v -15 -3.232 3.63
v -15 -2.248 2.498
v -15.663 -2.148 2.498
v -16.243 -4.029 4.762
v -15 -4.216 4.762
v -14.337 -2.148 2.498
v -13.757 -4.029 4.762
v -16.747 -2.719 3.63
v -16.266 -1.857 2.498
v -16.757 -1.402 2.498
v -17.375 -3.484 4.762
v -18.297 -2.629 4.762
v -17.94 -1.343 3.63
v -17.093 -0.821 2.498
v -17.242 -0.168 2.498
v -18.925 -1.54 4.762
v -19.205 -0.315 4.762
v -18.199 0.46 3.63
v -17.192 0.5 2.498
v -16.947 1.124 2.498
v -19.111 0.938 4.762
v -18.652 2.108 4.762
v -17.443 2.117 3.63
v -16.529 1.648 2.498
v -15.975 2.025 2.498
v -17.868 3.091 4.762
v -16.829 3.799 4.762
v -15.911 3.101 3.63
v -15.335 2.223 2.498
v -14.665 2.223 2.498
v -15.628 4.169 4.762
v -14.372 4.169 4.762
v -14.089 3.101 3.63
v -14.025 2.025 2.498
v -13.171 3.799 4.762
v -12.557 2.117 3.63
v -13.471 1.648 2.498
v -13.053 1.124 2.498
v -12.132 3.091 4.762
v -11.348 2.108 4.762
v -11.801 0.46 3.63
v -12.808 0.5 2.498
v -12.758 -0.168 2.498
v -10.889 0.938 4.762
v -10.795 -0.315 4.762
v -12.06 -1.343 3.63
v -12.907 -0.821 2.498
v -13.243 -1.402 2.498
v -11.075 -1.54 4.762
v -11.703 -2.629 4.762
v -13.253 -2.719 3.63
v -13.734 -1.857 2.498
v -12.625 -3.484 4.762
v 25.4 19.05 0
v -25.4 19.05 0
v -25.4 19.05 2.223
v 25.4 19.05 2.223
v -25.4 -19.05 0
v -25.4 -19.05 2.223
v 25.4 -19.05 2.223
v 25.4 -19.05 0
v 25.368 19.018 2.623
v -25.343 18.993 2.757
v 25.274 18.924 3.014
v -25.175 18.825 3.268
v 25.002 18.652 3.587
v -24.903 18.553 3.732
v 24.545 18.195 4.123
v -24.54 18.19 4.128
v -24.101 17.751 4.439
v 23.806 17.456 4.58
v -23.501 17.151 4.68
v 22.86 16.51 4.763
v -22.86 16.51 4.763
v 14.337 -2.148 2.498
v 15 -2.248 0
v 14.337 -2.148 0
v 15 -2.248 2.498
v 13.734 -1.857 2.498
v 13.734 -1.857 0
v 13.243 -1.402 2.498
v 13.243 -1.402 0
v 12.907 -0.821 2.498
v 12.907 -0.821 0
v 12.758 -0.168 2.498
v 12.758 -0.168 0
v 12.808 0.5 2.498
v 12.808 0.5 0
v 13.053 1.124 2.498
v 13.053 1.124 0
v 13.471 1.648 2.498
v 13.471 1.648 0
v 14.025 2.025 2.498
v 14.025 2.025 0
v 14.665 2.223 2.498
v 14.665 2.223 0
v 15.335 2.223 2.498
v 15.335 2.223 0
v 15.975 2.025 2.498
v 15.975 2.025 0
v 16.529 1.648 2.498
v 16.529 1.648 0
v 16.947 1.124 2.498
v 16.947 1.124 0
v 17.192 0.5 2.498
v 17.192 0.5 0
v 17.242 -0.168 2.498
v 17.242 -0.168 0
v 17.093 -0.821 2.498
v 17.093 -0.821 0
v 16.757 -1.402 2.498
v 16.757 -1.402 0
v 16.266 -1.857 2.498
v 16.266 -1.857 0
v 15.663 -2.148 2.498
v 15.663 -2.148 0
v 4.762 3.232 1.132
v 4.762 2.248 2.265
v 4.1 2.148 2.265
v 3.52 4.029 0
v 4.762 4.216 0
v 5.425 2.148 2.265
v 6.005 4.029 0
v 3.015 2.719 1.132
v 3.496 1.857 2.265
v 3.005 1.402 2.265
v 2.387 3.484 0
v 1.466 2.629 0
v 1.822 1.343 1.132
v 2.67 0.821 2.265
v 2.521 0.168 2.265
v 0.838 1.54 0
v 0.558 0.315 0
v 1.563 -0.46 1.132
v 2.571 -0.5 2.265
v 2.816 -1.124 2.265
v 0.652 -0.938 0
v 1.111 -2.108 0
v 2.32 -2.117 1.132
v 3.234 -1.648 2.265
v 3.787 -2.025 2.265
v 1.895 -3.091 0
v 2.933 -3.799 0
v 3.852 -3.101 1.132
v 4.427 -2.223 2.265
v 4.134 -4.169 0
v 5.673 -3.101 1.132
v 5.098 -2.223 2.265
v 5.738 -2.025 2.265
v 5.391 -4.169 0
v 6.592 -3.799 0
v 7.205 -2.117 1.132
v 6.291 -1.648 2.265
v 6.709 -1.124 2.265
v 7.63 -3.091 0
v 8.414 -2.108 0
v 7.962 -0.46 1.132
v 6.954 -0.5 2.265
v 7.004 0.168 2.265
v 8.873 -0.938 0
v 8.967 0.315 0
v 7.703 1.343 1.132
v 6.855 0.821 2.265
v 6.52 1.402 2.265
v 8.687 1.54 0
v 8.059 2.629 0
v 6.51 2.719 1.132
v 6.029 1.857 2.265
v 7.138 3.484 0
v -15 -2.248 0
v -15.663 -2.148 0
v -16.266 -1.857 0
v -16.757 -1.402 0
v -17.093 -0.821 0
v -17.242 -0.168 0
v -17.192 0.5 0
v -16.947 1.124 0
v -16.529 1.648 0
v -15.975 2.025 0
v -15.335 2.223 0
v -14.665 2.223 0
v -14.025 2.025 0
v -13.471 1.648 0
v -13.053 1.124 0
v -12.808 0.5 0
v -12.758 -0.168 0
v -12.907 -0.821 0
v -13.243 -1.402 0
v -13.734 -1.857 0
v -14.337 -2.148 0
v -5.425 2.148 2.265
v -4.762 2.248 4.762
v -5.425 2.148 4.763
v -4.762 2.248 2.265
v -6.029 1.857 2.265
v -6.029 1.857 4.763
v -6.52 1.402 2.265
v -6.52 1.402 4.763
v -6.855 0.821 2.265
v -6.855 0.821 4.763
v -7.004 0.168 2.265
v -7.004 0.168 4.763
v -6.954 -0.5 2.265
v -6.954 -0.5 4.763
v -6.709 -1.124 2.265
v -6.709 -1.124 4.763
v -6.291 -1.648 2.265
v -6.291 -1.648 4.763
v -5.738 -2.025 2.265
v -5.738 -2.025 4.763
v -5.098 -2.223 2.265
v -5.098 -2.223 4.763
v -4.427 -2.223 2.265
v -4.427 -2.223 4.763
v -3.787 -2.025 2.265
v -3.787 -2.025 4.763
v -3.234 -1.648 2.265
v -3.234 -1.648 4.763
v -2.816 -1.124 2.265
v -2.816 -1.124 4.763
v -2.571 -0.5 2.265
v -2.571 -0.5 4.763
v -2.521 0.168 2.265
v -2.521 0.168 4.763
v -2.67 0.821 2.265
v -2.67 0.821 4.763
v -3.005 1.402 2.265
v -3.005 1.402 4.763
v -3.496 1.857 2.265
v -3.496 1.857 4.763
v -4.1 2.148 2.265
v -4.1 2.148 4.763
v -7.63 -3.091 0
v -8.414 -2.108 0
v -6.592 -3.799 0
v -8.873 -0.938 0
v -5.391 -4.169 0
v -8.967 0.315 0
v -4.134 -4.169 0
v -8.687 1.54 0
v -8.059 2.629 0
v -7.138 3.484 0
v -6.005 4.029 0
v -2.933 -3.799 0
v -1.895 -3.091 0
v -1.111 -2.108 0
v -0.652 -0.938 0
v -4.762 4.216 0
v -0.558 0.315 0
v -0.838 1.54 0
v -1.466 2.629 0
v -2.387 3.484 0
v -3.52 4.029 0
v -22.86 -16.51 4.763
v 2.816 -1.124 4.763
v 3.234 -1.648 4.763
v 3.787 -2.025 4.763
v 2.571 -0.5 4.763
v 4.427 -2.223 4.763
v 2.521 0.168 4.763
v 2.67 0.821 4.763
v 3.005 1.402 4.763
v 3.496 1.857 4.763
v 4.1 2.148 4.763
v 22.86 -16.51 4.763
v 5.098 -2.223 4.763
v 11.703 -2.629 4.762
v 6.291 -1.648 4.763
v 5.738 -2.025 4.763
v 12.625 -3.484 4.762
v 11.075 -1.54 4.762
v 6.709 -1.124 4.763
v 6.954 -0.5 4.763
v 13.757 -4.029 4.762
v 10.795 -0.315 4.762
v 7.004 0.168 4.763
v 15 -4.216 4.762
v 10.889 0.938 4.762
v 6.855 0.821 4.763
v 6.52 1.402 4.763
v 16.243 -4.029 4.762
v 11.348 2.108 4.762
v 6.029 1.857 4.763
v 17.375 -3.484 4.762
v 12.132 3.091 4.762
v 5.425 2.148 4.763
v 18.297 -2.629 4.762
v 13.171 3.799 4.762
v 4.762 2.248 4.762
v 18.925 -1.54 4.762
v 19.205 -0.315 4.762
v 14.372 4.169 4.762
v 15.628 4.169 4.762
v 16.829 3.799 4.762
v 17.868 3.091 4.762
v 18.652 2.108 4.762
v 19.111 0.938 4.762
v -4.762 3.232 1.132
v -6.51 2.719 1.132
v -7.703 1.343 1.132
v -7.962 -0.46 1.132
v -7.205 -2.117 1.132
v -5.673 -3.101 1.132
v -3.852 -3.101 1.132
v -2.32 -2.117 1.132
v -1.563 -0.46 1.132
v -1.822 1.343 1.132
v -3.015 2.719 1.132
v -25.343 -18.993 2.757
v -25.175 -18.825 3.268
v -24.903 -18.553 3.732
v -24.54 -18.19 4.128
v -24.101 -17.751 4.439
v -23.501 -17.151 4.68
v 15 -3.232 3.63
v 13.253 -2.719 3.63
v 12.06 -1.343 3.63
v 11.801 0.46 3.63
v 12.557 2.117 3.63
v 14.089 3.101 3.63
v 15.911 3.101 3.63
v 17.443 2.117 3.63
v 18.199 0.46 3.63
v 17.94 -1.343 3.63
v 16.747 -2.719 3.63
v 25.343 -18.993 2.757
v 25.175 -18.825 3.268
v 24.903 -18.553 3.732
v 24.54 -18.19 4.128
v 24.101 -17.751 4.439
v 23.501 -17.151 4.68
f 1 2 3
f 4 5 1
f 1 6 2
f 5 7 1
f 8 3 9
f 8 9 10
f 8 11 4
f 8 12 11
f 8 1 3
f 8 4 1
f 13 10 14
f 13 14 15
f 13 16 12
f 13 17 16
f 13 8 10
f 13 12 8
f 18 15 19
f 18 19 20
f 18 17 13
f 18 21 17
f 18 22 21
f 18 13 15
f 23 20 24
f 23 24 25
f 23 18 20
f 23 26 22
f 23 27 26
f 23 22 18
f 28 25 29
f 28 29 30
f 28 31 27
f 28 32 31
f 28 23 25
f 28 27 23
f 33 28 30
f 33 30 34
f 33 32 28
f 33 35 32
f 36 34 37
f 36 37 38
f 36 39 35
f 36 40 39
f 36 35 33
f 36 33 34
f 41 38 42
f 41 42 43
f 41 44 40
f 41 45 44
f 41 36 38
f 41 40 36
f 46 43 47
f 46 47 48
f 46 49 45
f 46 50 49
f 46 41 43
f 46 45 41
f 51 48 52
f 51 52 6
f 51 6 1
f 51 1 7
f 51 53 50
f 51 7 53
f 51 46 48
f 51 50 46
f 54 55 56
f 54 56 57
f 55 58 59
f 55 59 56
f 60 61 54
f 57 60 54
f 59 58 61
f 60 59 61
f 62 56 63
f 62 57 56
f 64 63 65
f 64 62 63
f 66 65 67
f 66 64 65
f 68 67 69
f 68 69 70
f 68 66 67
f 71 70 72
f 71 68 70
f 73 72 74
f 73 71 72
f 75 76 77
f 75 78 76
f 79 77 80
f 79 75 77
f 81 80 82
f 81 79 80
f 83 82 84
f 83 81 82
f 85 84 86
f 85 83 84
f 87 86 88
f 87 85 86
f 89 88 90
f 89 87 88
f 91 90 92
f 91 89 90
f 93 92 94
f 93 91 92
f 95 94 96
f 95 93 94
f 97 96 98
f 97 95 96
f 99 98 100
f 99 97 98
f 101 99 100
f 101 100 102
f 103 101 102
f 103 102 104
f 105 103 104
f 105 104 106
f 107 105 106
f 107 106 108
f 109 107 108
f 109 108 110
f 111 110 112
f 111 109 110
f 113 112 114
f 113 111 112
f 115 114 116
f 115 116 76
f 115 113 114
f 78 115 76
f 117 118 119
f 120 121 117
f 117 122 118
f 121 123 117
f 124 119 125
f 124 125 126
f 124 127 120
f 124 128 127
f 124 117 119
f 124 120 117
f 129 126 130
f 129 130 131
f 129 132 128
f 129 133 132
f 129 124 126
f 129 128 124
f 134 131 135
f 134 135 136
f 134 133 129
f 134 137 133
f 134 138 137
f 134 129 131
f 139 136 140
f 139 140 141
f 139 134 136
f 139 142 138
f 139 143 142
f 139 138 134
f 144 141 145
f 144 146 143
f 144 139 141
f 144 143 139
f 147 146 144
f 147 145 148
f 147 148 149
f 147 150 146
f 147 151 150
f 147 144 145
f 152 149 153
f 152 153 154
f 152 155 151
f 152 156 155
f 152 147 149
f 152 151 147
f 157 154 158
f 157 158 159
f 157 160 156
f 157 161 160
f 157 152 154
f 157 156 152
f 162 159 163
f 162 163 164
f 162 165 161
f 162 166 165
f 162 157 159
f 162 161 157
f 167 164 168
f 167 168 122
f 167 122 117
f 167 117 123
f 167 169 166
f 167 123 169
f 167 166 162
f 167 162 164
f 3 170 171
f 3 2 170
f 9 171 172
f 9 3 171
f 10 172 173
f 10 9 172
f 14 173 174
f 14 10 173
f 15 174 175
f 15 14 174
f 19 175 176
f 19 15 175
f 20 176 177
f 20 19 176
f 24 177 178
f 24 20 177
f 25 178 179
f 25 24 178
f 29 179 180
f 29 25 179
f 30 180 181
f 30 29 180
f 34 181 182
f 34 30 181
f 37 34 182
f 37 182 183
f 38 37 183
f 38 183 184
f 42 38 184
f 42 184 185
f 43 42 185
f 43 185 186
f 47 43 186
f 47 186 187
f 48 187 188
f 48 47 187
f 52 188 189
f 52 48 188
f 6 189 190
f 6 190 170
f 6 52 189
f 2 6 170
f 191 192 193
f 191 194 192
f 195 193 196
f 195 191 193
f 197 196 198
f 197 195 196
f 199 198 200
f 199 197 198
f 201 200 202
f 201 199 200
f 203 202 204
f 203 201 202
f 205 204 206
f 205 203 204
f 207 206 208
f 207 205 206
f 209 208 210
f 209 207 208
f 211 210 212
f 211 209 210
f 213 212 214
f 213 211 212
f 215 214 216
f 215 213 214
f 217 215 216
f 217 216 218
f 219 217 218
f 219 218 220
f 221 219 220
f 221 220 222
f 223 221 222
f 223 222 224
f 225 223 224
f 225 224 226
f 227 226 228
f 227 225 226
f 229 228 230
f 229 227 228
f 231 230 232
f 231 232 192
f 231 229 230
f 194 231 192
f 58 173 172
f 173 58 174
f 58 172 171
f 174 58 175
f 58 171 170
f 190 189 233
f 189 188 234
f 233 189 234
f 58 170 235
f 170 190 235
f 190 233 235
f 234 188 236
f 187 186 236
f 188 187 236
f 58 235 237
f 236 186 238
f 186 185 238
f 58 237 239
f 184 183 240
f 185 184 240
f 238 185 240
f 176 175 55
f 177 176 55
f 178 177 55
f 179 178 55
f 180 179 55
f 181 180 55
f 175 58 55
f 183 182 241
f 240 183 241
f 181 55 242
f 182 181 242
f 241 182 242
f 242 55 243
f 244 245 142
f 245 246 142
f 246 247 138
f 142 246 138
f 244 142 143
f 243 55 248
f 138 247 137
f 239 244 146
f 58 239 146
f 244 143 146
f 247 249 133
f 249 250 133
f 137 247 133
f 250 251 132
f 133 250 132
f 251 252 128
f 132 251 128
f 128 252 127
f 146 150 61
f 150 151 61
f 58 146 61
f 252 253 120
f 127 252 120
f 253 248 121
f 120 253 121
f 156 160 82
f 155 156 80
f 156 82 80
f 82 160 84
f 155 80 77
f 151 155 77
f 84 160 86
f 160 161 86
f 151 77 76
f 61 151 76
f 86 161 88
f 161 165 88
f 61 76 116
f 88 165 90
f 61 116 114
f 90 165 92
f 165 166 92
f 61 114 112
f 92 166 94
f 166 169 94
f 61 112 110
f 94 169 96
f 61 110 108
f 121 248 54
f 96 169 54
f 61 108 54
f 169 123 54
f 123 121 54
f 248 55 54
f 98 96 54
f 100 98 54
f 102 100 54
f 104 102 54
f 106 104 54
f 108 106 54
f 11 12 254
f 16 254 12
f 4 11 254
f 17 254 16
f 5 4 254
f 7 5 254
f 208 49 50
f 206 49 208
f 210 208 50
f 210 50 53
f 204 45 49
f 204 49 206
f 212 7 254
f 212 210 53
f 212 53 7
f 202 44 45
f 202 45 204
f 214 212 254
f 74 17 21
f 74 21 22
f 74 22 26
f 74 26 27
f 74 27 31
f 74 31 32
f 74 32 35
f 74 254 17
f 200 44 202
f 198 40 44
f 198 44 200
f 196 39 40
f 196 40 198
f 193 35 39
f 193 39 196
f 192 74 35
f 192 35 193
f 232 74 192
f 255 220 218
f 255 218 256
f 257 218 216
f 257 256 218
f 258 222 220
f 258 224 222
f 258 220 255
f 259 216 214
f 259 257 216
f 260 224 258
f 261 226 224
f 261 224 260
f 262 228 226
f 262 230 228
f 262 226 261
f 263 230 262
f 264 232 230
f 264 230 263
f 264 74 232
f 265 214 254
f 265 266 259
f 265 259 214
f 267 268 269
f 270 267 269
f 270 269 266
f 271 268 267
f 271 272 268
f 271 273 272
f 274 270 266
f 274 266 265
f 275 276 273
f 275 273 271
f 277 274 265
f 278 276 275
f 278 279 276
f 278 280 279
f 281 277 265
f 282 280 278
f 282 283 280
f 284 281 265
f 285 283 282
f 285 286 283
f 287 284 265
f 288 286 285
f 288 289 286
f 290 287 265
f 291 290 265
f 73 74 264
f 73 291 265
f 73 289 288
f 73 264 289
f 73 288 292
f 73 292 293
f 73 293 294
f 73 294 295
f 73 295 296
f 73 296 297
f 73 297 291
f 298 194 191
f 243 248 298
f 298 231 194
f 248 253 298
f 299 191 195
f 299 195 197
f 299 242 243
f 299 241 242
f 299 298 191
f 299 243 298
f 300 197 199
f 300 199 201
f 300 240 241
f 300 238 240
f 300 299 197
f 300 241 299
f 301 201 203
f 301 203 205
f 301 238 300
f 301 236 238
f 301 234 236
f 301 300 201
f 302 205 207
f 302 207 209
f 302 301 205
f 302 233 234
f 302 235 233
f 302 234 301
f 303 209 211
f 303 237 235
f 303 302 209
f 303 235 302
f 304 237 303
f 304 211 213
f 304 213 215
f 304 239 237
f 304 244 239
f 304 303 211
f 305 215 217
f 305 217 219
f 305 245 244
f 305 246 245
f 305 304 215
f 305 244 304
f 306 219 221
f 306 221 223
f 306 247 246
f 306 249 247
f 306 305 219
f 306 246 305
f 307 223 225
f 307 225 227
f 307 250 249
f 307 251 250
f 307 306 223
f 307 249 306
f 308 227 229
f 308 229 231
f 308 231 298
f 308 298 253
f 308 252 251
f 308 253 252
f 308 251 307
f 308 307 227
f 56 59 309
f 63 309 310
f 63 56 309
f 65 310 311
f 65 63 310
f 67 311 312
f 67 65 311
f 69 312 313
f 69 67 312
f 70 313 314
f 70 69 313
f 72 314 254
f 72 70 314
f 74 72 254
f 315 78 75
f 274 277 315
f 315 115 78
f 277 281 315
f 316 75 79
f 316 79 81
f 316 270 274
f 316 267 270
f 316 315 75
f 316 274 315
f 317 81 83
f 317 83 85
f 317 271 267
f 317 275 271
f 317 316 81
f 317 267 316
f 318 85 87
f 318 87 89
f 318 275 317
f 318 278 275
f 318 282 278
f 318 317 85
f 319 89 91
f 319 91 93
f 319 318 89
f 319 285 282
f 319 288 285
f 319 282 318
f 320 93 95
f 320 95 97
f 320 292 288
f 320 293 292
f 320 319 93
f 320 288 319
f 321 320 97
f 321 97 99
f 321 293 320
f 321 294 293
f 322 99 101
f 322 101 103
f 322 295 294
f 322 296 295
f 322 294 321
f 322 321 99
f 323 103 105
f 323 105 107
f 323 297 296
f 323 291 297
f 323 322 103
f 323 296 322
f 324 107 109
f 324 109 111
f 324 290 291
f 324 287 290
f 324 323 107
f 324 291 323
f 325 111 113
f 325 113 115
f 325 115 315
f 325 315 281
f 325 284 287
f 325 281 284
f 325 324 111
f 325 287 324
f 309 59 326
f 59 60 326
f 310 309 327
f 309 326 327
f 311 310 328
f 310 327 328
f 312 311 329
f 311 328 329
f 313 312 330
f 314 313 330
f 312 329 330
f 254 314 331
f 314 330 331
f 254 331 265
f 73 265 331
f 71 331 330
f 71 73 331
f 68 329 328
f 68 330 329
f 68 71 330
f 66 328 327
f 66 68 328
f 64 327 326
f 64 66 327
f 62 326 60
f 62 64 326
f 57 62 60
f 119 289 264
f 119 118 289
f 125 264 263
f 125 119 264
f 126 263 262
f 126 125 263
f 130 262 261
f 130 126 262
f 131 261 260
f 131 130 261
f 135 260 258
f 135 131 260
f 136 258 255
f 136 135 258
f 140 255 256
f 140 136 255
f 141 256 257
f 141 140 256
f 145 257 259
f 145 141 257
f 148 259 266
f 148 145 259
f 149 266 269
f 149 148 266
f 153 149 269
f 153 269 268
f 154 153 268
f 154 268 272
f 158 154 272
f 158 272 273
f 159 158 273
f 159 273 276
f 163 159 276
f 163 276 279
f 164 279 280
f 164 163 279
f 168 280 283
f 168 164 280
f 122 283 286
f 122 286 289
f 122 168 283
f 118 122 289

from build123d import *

# Parameters (mm, degrees)
SKETCH1_W                                     = 50.8
SKETCH1_H                                     = 38.1
BODY_DEPTH                                    = 4.7625
CSK_FOR_8_FLAT_HEAD_MACHINE_SCREW1_AT_2_COUNT = 2
CSK_FOR_8_FLAT_HEAD_MACHINE_SCREW1_AT_2_PITCH = 30
CSK_FOR_8_FLAT_HEAD_MACHINE_SCREW2_AT_2_COUNT = 2
CSK_FOR_8_FLAT_HEAD_MACHINE_SCREW2_AT_2_PITCH = 9.525
FILLET1_R                                     = 2.54


with BuildPart() as part:
    # Sketch1 → Body (new body)
    with BuildSketch(Plane.XY):
        Rectangle(SKETCH1_W, SKETCH1_H)
    extrude(amount=BODY_DEPTH)

    # Sketch2 → CSK for #8 Flat Head Machine Screw1 (revolve, cut)
    with BuildSketch(Plane(origin=(-15, 0, 4.7625), x_dir=(0, -1, 0), z_dir=(1, 0, 0))):
        Polygon((0, 0), (0, 4.7625), (2.2479, 4.7625), (2.2479, 2.26450021), (4.2164, 0), align=None)
    csk_for_8_flat_head_machine_screw1 = revolve(axis=Axis((-15, 0, 11.1125), (0, 0, -1)), mode=Mode.SUBTRACT)

    # CSK for #8 Flat Head Machine Screw1 at 2: CSK for #8 Flat Head Machine Screw1 ×2
    with Locations(*[(i * CSK_FOR_8_FLAT_HEAD_MACHINE_SCREW1_AT_2_PITCH, 0, 0) for i in range(1, CSK_FOR_8_FLAT_HEAD_MACHINE_SCREW1_AT_2_COUNT)]):
        add(csk_for_8_flat_head_machine_screw1, mode=Mode.SUBTRACT)

    # Sketch3 → CSK for #8 Flat Head Machine Screw2 (revolve, cut)
    with BuildSketch(Plane.YZ.offset(4.7625)):
        Polygon((0, 0), (0, 4.7625), (2.2479, 4.7625), (2.2479, 2.26450021), (4.2164, 0), align=None)
    csk_for_8_flat_head_machine_screw2 = revolve(axis=Axis((4.7625, 0, -6.35), (0, 0, 1)), mode=Mode.SUBTRACT)

    # CSK for #8 Flat Head Machine Screw2 at 2: CSK for #8 Flat Head Machine Screw2 ×2
    with Locations(*[(-i * CSK_FOR_8_FLAT_HEAD_MACHINE_SCREW2_AT_2_PITCH, 0, 0) for i in range(1, CSK_FOR_8_FLAT_HEAD_MACHINE_SCREW2_AT_2_COUNT)]):
        add(csk_for_8_flat_head_machine_screw2, mode=Mode.SUBTRACT)

    # Fillet1
    fillet1_edges = [part.edges().sort_by_distance(p)[0] for p in [
        (-25.4, 0, 4.7625),
        (0, -19.05, 4.7625),
        (25.4, 0, 4.7625),
        (0, 19.05, 4.7625),
    ]]
    fillet(fillet1_edges, radius=FILLET1_R)


solid = part.part
